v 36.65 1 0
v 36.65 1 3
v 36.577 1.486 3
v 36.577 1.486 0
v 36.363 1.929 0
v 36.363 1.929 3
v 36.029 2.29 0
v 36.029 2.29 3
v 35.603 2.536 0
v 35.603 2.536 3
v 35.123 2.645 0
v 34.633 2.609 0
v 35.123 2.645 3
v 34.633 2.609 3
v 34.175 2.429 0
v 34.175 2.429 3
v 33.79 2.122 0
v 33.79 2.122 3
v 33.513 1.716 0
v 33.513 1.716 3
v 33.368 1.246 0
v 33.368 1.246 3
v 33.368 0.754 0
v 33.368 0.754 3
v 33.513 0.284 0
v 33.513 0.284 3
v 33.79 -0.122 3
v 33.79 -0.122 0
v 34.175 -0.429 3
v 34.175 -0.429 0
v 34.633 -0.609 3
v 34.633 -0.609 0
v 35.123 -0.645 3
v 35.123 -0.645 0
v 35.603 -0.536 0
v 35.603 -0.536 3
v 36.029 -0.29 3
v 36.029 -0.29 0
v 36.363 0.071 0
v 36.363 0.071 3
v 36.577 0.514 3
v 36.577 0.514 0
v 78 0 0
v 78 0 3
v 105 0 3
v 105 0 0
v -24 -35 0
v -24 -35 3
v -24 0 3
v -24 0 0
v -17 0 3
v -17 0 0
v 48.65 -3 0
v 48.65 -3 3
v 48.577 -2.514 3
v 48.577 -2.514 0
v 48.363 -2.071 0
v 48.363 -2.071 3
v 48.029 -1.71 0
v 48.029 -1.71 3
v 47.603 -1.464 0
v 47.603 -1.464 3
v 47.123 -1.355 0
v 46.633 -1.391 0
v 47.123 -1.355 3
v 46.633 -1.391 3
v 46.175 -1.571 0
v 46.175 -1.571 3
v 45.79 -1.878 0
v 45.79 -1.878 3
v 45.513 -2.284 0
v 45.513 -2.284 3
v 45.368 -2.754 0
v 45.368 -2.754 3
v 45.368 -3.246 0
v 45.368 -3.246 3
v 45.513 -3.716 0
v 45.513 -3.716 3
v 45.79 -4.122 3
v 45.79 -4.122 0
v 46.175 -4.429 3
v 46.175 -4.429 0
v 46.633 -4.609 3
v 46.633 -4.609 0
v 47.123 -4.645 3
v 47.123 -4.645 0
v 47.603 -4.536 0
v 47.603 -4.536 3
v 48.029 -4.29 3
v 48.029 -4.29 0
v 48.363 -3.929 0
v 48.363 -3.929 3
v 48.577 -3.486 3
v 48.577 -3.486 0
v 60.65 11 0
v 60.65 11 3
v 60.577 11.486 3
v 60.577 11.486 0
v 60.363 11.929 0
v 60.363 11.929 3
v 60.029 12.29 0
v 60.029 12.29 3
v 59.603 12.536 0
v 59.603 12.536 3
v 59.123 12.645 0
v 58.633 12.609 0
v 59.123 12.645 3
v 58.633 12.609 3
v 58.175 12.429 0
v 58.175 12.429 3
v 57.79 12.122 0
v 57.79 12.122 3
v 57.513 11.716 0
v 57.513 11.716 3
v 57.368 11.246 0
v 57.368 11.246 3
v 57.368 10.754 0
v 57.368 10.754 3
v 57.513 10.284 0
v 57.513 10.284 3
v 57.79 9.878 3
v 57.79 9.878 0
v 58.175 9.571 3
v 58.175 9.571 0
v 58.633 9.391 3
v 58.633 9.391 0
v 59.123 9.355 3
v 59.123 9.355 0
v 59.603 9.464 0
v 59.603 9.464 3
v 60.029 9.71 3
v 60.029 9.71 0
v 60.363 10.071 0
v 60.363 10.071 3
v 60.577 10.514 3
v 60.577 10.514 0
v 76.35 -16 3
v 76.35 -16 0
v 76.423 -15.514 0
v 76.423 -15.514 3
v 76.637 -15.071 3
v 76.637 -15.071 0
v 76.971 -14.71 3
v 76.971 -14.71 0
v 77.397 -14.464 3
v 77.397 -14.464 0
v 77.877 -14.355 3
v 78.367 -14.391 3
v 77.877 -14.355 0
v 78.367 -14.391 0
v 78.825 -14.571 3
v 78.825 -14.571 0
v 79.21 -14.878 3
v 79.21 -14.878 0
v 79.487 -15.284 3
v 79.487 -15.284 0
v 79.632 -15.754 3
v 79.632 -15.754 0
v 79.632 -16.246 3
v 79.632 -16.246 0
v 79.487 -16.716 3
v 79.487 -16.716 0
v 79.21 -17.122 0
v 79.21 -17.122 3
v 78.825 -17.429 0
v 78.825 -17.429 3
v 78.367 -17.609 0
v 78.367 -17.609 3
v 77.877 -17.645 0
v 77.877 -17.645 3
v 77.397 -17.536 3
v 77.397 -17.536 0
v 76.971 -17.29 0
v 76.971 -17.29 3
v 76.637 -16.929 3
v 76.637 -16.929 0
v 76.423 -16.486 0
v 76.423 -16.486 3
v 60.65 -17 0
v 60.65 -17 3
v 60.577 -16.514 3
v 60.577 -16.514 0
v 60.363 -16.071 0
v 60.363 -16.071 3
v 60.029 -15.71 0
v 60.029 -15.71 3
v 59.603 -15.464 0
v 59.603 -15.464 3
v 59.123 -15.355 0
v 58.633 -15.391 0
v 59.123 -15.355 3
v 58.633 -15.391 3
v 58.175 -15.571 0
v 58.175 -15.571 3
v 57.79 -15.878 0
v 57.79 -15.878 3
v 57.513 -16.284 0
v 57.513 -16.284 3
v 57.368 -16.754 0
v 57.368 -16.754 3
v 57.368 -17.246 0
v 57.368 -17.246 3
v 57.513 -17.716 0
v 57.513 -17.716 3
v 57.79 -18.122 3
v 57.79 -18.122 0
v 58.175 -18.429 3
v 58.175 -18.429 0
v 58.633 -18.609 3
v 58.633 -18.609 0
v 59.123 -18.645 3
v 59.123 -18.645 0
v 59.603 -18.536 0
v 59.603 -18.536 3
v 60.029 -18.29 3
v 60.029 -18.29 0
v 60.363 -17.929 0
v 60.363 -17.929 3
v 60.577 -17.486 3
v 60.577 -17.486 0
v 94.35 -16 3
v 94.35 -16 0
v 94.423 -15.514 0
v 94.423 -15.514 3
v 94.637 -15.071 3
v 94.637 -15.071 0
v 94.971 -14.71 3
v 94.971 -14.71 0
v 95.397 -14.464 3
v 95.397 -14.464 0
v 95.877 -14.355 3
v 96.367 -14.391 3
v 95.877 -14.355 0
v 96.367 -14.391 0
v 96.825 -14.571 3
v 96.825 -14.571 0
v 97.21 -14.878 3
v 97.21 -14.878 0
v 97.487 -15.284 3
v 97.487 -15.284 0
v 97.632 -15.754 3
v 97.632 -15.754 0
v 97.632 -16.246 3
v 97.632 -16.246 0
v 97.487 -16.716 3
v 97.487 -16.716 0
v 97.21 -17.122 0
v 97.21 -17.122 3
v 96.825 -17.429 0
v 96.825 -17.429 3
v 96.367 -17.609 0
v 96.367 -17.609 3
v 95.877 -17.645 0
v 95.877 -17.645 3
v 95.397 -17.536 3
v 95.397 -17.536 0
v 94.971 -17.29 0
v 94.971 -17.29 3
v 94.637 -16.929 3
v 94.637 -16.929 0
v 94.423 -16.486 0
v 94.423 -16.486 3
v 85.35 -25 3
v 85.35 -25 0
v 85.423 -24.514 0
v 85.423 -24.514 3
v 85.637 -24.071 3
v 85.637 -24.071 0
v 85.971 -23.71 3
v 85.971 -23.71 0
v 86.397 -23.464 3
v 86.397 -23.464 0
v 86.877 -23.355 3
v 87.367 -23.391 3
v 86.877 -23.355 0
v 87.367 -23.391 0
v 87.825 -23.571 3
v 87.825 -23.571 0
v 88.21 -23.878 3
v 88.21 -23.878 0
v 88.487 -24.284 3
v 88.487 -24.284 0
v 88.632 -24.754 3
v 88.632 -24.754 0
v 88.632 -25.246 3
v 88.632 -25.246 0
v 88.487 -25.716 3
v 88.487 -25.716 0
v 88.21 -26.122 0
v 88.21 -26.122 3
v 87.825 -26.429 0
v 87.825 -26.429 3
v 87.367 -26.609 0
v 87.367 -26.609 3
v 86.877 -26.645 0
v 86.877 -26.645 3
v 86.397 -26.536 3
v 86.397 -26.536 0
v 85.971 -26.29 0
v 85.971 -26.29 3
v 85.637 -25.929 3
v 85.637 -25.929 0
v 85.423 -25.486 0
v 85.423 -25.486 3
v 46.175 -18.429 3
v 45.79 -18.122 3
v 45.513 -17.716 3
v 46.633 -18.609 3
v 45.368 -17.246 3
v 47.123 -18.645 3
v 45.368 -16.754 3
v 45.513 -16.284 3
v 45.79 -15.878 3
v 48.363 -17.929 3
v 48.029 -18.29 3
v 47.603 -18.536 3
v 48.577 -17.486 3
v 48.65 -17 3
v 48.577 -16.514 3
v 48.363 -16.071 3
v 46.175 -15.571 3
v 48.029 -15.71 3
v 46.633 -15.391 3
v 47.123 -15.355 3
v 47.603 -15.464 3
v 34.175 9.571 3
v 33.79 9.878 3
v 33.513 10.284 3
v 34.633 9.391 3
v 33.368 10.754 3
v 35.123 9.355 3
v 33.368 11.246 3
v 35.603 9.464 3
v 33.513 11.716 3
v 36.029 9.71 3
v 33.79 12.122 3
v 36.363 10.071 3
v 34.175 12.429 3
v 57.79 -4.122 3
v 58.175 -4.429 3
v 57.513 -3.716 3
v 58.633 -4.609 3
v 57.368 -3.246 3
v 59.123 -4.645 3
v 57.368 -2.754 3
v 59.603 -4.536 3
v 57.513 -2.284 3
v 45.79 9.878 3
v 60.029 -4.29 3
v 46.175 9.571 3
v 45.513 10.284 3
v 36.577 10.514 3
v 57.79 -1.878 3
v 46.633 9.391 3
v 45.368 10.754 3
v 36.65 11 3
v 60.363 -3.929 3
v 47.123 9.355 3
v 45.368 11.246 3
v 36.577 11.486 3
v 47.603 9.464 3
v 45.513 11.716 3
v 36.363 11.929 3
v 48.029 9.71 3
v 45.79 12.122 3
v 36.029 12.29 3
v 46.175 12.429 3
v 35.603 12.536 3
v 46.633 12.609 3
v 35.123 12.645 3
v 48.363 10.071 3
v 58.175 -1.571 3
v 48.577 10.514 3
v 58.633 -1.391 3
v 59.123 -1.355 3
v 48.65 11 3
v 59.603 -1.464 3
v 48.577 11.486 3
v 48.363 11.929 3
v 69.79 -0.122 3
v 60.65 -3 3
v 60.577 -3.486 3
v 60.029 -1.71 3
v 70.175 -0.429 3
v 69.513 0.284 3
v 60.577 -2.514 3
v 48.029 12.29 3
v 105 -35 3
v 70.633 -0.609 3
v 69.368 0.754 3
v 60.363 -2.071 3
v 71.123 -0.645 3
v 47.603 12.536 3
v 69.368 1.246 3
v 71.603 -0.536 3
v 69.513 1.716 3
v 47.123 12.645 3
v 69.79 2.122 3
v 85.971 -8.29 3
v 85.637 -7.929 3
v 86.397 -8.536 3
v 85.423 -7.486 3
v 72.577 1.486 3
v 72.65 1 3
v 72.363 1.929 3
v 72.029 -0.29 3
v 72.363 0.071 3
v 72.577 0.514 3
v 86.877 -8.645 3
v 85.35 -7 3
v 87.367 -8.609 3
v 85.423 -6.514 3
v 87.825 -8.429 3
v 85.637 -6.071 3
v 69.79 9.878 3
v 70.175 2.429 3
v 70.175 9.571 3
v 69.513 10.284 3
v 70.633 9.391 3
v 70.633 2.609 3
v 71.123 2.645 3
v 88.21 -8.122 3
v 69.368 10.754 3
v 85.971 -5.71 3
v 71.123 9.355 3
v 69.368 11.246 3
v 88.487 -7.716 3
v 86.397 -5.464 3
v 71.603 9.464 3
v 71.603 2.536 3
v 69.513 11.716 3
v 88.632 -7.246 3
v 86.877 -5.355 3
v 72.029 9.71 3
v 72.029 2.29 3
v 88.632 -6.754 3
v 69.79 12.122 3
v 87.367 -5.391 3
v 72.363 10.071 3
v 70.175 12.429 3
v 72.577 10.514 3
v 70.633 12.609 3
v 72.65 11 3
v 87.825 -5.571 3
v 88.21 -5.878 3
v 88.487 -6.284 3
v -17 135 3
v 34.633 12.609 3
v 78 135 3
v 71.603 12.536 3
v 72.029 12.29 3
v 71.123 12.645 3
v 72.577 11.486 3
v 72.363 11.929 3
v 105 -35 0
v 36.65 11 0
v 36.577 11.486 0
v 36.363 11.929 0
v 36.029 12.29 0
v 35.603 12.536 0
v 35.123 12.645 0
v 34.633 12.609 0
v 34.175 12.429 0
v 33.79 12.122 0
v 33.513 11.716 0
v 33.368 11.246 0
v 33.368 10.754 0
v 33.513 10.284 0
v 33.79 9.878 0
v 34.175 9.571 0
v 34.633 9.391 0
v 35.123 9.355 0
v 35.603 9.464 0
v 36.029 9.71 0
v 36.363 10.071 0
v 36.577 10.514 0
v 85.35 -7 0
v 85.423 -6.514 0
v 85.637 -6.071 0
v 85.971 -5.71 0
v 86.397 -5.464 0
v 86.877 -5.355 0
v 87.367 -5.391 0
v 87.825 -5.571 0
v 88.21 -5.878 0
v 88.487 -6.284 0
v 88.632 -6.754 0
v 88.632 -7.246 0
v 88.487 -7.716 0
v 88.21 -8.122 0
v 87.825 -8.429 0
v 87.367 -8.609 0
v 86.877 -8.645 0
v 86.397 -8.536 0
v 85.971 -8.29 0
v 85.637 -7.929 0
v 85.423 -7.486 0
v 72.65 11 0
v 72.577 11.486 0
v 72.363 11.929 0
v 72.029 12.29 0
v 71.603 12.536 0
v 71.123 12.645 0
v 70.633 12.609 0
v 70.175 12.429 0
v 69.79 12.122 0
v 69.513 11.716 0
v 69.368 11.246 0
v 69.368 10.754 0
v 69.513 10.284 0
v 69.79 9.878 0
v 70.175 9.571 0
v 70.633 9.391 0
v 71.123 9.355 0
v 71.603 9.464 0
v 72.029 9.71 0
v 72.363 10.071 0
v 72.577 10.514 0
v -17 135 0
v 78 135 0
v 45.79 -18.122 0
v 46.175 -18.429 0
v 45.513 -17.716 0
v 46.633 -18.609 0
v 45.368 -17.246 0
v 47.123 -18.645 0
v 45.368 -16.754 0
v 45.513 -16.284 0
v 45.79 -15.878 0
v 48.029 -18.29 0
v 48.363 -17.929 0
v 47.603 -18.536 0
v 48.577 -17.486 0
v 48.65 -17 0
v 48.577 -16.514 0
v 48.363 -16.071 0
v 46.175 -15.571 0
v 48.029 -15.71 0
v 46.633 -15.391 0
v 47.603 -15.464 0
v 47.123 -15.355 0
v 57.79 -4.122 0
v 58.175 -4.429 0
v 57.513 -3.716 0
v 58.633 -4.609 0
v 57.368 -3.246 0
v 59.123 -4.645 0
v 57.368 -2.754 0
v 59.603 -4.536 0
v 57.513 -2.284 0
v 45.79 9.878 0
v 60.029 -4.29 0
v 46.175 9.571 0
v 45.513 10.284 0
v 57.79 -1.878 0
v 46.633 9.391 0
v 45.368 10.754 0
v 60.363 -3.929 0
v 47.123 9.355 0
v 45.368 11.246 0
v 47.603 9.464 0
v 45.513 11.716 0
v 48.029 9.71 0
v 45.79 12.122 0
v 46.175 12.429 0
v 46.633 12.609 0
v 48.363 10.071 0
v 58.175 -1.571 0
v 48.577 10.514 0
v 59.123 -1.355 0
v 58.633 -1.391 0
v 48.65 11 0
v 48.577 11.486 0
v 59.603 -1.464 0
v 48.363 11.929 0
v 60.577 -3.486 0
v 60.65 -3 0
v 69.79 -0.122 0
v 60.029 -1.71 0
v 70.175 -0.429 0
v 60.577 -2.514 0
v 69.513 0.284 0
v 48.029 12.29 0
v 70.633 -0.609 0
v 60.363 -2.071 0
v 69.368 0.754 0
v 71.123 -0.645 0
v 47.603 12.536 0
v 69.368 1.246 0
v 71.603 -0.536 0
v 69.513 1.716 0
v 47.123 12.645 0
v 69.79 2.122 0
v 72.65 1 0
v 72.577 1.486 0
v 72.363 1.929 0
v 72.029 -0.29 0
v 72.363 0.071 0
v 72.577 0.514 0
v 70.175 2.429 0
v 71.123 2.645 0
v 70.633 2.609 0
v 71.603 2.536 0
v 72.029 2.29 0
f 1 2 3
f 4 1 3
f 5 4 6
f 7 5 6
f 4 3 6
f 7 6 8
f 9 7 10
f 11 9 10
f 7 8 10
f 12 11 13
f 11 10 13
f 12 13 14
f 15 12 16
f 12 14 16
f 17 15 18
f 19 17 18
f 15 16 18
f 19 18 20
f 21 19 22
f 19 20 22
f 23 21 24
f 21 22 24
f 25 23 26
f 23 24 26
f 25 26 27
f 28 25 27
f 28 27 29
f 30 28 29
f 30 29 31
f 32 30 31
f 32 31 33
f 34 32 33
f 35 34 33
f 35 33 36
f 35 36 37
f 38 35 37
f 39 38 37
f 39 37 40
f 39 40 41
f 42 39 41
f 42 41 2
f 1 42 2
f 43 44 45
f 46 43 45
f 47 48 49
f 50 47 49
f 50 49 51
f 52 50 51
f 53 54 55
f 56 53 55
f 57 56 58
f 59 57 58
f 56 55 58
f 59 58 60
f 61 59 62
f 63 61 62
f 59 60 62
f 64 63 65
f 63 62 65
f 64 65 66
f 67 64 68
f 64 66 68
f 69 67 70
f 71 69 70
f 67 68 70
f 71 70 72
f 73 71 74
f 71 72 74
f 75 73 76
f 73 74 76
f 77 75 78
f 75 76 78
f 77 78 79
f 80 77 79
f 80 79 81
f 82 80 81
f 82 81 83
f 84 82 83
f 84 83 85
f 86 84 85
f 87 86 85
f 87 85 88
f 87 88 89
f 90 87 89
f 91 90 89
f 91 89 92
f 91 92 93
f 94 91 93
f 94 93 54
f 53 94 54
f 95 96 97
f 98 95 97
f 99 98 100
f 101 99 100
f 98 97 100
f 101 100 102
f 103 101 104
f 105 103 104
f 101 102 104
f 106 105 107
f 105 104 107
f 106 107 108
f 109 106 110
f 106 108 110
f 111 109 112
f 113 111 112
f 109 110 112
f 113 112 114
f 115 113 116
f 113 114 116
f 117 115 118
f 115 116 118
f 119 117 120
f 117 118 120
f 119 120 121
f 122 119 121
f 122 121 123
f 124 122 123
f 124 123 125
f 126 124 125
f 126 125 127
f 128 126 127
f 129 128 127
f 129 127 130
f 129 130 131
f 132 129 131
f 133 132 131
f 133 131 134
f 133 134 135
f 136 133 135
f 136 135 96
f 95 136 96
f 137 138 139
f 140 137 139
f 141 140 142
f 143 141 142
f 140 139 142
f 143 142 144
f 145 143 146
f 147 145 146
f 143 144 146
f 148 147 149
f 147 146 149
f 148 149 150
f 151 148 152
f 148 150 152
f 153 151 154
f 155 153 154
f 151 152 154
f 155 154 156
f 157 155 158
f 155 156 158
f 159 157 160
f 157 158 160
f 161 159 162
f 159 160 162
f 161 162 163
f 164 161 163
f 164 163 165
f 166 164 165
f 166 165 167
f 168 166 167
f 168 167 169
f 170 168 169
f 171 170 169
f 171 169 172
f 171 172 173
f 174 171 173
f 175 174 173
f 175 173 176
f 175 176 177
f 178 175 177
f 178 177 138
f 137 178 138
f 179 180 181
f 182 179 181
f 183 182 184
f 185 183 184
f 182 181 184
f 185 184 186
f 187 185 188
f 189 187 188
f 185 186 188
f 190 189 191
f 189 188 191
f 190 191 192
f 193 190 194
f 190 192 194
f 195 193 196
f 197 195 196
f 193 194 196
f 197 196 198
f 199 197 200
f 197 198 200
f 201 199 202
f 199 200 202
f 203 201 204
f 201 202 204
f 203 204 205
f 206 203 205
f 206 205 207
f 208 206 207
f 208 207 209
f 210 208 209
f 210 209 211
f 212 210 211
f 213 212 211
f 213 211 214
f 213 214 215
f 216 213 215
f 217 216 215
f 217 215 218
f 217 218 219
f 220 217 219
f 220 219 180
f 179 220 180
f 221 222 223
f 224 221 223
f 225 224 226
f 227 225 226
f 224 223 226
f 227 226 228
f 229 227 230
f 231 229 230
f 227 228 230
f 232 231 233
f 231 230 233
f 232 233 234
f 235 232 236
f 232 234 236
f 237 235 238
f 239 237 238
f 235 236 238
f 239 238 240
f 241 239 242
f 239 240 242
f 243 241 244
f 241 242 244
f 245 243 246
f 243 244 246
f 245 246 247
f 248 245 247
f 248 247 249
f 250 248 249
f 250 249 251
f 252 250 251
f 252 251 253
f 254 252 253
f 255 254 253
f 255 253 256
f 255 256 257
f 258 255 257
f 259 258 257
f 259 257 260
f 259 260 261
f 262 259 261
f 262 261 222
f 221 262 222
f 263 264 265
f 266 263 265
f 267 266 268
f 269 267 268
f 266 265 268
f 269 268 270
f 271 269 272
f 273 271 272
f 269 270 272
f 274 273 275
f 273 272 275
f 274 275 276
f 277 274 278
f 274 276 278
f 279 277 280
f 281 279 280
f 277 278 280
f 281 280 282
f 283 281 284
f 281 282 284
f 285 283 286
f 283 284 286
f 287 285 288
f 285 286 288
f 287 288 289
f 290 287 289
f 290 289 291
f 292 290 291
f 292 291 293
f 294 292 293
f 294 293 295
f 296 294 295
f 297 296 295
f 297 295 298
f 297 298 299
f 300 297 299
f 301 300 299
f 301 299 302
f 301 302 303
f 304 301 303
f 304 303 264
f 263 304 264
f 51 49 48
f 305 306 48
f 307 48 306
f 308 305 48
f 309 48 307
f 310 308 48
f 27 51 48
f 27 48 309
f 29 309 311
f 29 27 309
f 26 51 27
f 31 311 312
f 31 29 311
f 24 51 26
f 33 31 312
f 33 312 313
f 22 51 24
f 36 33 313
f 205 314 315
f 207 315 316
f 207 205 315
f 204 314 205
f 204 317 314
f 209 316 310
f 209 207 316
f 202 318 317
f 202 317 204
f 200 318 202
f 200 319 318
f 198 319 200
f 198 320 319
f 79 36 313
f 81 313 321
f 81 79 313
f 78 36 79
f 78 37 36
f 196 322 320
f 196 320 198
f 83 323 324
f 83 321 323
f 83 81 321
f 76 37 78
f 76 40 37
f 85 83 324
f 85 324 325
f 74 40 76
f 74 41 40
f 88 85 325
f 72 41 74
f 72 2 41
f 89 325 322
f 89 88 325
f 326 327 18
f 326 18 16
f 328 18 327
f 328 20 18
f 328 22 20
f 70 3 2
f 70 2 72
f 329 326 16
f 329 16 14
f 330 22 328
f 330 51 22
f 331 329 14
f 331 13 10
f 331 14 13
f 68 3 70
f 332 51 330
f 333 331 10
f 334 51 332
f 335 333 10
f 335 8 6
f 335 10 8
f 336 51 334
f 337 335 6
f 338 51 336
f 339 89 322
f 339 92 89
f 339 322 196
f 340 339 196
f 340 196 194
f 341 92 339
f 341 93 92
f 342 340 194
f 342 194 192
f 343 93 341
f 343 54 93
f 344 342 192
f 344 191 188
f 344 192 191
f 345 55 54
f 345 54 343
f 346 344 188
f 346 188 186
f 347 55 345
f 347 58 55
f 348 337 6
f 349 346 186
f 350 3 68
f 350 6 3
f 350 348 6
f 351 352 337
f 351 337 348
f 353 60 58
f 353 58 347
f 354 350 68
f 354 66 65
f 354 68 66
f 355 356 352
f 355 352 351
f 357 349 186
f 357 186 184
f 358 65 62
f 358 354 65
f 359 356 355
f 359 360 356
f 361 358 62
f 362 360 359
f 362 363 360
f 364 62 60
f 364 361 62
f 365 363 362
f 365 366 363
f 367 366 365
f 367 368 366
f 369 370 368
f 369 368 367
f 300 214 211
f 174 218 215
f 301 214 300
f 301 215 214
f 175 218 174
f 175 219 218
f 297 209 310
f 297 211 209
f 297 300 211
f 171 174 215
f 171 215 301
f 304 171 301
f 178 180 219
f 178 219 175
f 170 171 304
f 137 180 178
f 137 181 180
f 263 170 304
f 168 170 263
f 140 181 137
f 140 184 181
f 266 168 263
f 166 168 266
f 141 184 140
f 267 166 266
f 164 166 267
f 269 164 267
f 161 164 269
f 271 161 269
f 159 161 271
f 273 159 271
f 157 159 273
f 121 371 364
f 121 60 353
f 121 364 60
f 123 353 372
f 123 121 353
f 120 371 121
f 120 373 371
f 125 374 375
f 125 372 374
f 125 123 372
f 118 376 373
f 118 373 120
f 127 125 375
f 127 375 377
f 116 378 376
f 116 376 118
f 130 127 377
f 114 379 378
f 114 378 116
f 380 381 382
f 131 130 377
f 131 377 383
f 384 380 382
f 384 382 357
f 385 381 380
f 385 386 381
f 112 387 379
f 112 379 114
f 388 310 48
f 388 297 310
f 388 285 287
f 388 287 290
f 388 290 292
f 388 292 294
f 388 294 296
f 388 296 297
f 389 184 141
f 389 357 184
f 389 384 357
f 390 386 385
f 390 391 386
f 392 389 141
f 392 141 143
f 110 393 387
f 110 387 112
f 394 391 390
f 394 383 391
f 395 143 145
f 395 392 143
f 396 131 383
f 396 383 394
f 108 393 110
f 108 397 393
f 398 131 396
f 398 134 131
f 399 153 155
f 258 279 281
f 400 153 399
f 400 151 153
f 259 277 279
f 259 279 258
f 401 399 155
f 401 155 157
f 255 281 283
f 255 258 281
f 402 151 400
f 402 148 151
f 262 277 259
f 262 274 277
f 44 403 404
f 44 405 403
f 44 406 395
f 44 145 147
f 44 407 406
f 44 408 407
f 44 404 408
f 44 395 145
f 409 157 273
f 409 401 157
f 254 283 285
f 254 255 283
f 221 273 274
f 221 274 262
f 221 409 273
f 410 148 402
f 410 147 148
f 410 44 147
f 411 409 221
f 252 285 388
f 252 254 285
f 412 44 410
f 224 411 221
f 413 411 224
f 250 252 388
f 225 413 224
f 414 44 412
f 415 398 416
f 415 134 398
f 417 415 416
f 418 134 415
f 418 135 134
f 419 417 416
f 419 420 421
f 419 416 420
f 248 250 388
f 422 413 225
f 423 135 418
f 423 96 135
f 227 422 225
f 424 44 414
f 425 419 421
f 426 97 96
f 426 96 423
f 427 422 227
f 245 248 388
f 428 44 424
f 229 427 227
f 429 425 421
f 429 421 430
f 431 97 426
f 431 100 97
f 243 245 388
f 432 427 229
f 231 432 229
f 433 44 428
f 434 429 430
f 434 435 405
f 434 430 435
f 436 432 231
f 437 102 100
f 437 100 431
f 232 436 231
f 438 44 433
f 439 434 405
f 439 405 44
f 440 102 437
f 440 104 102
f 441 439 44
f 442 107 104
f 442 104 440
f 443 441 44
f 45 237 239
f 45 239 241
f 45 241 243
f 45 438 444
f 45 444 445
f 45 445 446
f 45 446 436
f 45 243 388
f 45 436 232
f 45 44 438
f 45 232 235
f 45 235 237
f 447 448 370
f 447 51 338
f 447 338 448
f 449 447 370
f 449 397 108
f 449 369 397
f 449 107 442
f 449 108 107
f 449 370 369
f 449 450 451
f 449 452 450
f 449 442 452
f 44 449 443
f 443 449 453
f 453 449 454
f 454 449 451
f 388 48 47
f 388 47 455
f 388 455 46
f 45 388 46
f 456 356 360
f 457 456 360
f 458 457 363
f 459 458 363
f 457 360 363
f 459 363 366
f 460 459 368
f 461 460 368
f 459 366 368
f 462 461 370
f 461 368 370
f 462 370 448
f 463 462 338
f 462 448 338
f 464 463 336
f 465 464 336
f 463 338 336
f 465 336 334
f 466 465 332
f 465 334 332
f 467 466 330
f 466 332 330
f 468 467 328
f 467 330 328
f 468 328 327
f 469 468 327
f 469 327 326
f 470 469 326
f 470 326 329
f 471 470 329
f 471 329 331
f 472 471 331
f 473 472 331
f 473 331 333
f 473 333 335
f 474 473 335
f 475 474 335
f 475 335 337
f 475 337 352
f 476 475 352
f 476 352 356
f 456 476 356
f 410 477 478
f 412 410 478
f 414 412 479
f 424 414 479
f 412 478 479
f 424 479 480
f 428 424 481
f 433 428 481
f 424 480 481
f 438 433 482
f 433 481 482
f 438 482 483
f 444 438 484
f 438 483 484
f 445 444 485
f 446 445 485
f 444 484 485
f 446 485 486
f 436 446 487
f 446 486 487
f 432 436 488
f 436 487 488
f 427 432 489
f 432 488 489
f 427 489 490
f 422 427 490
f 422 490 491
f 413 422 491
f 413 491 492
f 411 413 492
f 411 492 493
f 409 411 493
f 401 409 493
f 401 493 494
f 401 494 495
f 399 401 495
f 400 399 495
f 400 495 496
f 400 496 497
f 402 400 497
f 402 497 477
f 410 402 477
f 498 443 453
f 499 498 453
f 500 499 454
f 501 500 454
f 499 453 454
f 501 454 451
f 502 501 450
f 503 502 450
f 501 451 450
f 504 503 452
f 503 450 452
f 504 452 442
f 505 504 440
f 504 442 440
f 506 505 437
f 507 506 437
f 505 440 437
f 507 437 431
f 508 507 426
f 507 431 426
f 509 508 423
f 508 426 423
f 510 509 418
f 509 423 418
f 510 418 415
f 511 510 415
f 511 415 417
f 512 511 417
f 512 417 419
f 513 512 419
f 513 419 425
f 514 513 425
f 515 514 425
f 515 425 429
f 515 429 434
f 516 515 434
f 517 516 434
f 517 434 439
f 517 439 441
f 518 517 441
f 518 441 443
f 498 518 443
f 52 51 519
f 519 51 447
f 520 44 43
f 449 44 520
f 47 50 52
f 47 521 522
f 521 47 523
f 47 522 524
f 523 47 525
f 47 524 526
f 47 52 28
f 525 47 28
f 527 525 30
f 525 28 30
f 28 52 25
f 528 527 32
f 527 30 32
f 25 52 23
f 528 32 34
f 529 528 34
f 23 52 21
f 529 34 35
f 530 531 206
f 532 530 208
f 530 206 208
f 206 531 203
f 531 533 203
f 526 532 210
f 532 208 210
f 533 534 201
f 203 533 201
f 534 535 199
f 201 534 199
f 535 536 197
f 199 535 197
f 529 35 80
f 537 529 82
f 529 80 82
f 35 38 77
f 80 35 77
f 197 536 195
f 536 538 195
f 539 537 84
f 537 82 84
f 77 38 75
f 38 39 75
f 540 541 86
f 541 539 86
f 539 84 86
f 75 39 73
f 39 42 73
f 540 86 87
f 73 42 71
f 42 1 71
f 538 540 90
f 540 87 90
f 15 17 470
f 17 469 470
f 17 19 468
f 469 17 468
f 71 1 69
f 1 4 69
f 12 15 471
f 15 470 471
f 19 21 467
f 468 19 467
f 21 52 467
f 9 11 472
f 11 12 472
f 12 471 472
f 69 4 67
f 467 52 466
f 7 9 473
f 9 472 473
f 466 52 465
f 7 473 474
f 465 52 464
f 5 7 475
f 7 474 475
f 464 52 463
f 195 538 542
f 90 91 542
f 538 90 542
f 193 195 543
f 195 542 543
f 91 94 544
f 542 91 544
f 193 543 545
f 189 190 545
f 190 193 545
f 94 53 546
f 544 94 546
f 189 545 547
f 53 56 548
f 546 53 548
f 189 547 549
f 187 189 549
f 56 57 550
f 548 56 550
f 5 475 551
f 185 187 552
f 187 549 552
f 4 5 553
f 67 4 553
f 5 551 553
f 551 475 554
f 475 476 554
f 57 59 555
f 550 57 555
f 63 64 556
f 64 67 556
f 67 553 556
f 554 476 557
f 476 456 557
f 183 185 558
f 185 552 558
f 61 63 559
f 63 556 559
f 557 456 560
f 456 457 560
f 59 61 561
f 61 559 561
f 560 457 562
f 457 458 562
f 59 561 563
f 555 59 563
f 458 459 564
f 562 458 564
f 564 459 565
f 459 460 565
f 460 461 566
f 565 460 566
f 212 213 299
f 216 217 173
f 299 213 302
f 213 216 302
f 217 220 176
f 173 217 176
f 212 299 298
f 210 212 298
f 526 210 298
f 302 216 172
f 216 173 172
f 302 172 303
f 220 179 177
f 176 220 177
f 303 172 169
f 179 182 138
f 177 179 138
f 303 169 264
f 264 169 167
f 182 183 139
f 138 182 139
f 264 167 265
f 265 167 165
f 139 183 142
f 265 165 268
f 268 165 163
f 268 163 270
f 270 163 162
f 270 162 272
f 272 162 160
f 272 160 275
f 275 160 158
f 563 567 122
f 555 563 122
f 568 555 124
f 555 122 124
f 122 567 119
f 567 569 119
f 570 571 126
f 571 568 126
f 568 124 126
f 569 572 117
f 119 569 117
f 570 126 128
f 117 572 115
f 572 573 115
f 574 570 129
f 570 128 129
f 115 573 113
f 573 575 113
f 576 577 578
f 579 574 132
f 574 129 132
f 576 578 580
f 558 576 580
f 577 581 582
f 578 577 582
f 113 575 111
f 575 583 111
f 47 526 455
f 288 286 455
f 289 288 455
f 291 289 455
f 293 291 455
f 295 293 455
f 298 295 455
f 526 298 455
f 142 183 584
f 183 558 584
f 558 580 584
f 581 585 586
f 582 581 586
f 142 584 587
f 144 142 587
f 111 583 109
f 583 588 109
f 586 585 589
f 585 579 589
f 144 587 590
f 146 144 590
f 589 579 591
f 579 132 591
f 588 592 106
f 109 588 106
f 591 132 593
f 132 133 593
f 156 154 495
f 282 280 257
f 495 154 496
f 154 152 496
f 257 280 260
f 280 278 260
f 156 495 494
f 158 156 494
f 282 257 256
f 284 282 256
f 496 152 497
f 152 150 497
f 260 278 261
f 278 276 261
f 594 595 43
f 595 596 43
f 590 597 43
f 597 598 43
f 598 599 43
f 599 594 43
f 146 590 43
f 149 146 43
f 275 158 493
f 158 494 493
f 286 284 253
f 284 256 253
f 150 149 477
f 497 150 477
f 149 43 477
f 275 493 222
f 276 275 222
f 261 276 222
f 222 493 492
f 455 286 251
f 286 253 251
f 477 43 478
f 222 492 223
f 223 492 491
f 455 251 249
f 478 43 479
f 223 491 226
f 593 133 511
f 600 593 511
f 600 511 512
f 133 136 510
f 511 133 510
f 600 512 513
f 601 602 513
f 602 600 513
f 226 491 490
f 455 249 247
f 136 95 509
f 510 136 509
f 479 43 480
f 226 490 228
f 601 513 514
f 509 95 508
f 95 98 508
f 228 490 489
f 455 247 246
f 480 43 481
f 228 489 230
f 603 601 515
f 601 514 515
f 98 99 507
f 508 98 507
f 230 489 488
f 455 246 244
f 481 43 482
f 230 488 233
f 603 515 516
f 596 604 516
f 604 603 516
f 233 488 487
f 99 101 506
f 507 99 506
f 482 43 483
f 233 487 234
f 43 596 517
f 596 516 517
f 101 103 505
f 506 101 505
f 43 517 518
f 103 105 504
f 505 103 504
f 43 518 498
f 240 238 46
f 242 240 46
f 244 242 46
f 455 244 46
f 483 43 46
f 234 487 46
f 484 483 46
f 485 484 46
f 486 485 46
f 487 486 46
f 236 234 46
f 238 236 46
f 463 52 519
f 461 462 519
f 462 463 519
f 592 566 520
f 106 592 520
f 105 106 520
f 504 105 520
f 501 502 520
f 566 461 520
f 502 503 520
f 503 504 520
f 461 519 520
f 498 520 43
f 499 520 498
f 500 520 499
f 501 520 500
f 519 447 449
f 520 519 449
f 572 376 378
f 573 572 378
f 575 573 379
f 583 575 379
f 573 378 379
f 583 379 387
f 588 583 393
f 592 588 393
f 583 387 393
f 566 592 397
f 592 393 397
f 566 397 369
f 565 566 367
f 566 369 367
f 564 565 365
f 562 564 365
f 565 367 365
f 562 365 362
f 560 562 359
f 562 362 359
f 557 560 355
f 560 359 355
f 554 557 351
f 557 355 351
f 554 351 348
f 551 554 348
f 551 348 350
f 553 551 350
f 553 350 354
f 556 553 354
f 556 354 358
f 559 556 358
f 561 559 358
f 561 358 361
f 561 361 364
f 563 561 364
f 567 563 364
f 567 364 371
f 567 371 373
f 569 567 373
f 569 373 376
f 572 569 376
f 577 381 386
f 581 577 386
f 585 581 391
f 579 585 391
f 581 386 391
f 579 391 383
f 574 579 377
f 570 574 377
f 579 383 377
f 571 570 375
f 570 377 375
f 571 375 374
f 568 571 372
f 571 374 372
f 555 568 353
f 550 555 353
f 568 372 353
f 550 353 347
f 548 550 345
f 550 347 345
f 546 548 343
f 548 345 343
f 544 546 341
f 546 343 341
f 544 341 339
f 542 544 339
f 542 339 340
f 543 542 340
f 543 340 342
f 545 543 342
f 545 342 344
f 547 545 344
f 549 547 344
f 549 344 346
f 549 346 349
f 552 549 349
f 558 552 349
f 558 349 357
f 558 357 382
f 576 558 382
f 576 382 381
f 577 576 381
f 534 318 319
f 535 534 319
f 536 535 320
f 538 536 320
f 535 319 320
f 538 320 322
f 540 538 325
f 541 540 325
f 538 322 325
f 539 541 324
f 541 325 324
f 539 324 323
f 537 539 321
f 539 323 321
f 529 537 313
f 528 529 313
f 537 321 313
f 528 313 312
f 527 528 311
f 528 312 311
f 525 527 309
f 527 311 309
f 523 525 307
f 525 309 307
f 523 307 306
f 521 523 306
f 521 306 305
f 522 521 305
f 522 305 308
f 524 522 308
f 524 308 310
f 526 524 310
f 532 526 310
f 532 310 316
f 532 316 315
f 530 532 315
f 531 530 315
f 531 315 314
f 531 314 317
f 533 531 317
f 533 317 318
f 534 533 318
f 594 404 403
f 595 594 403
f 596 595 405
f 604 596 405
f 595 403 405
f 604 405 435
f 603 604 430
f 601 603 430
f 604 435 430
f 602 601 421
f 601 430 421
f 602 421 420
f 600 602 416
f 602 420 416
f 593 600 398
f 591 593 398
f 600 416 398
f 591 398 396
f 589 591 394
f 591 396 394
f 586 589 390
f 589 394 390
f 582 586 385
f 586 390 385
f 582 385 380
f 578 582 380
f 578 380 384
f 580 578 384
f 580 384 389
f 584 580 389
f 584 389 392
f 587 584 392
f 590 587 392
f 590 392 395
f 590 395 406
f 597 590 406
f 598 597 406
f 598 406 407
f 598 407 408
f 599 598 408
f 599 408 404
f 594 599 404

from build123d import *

# Parameters (mm, degrees)
SKETCH_1_W          = 105
SKETCH_1_H          = 35
EXTRUDE_1_DEPTH     = 3
SKETCH_3_W          = 24
SKETCH_3_H          = 35
EXTRUDE_2_DEPTH     = 3
SKETCH_4_W          = 95
SKETCH_4_H          = 135
EXTRUDE_3_DEPTH     = 3
SKETCH_5_R          = 1.65
CUT_EXTRUDE_1_DEPTH = 172.052623482
SKETCH_6_R          = 1.65
CUT_EXTRUDE_2_DEPTH = 40


with BuildPart() as part:
    # 草图1 → 凸台-拉伸1 (new body)
    with BuildSketch(Plane.XY):
        with Locations((52.5, -17.5)):
            Rectangle(SKETCH_1_W, SKETCH_1_H)
    extrude(amount=EXTRUDE_1_DEPTH)

    # 草图3 → 凸台-拉伸2 (add)
    with BuildSketch(Plane.XY.offset(3)):
        with Locations((-12, -17.5)):
            Rectangle(SKETCH_3_W, SKETCH_3_H)
    extrude(amount=-EXTRUDE_2_DEPTH)

    # 草图4 → 凸台-拉伸3 (add)
    with BuildSketch(Plane.XY.offset(3)):
        with Locations((30.5, 67.5)):
            Rectangle(SKETCH_4_W, SKETCH_4_H)
    extrude(amount=-EXTRUDE_3_DEPTH)

    # 草图5 → 切除-拉伸1 (cut, through all)
    with BuildSketch(Plane(origin=(0, 0, 0), x_dir=(-1, 0, 0), z_dir=(0, 0, -1))):
        with Locations((-87, -7)):
            Circle(SKETCH_5_R)
        with Locations((-96, -16)):
            Circle(SKETCH_5_R)
        with Locations((-87, -25)):
            Circle(SKETCH_5_R)
        with Locations((-78, -16)):
            Circle(SKETCH_5_R)
    extrude(amount=-CUT_EXTRUDE_1_DEPTH, mode=Mode.SUBTRACT)

    # 草图6 → 切除-拉伸2 (cut)
    with BuildSketch(Plane.XY.offset(3)):
        with Locations((35, 1)):
            Circle(SKETCH_6_R)
        with Locations((35, 11)):
            Circle(SKETCH_6_R)
        with Locations((71, 1)):
            Circle(SKETCH_6_R)
        with Locations((71, 11)):
            Circle(SKETCH_6_R)
        with Locations((47, -17)):
            Circle(SKETCH_6_R)
        with Locations((59, -17)):
            Circle(SKETCH_6_R)
        with Locations((59, -3)):
            Circle(SKETCH_6_R)
        with Locations((47, -3)):
            Circle(SKETCH_6_R)
        with Locations((59, 11)):
            Circle(SKETCH_6_R)
        with Locations((47, 11)):
            Circle(SKETCH_6_R)
    extrude(amount=-CUT_EXTRUDE_2_DEPTH, mode=Mode.SUBTRACT)


solid = part.part
